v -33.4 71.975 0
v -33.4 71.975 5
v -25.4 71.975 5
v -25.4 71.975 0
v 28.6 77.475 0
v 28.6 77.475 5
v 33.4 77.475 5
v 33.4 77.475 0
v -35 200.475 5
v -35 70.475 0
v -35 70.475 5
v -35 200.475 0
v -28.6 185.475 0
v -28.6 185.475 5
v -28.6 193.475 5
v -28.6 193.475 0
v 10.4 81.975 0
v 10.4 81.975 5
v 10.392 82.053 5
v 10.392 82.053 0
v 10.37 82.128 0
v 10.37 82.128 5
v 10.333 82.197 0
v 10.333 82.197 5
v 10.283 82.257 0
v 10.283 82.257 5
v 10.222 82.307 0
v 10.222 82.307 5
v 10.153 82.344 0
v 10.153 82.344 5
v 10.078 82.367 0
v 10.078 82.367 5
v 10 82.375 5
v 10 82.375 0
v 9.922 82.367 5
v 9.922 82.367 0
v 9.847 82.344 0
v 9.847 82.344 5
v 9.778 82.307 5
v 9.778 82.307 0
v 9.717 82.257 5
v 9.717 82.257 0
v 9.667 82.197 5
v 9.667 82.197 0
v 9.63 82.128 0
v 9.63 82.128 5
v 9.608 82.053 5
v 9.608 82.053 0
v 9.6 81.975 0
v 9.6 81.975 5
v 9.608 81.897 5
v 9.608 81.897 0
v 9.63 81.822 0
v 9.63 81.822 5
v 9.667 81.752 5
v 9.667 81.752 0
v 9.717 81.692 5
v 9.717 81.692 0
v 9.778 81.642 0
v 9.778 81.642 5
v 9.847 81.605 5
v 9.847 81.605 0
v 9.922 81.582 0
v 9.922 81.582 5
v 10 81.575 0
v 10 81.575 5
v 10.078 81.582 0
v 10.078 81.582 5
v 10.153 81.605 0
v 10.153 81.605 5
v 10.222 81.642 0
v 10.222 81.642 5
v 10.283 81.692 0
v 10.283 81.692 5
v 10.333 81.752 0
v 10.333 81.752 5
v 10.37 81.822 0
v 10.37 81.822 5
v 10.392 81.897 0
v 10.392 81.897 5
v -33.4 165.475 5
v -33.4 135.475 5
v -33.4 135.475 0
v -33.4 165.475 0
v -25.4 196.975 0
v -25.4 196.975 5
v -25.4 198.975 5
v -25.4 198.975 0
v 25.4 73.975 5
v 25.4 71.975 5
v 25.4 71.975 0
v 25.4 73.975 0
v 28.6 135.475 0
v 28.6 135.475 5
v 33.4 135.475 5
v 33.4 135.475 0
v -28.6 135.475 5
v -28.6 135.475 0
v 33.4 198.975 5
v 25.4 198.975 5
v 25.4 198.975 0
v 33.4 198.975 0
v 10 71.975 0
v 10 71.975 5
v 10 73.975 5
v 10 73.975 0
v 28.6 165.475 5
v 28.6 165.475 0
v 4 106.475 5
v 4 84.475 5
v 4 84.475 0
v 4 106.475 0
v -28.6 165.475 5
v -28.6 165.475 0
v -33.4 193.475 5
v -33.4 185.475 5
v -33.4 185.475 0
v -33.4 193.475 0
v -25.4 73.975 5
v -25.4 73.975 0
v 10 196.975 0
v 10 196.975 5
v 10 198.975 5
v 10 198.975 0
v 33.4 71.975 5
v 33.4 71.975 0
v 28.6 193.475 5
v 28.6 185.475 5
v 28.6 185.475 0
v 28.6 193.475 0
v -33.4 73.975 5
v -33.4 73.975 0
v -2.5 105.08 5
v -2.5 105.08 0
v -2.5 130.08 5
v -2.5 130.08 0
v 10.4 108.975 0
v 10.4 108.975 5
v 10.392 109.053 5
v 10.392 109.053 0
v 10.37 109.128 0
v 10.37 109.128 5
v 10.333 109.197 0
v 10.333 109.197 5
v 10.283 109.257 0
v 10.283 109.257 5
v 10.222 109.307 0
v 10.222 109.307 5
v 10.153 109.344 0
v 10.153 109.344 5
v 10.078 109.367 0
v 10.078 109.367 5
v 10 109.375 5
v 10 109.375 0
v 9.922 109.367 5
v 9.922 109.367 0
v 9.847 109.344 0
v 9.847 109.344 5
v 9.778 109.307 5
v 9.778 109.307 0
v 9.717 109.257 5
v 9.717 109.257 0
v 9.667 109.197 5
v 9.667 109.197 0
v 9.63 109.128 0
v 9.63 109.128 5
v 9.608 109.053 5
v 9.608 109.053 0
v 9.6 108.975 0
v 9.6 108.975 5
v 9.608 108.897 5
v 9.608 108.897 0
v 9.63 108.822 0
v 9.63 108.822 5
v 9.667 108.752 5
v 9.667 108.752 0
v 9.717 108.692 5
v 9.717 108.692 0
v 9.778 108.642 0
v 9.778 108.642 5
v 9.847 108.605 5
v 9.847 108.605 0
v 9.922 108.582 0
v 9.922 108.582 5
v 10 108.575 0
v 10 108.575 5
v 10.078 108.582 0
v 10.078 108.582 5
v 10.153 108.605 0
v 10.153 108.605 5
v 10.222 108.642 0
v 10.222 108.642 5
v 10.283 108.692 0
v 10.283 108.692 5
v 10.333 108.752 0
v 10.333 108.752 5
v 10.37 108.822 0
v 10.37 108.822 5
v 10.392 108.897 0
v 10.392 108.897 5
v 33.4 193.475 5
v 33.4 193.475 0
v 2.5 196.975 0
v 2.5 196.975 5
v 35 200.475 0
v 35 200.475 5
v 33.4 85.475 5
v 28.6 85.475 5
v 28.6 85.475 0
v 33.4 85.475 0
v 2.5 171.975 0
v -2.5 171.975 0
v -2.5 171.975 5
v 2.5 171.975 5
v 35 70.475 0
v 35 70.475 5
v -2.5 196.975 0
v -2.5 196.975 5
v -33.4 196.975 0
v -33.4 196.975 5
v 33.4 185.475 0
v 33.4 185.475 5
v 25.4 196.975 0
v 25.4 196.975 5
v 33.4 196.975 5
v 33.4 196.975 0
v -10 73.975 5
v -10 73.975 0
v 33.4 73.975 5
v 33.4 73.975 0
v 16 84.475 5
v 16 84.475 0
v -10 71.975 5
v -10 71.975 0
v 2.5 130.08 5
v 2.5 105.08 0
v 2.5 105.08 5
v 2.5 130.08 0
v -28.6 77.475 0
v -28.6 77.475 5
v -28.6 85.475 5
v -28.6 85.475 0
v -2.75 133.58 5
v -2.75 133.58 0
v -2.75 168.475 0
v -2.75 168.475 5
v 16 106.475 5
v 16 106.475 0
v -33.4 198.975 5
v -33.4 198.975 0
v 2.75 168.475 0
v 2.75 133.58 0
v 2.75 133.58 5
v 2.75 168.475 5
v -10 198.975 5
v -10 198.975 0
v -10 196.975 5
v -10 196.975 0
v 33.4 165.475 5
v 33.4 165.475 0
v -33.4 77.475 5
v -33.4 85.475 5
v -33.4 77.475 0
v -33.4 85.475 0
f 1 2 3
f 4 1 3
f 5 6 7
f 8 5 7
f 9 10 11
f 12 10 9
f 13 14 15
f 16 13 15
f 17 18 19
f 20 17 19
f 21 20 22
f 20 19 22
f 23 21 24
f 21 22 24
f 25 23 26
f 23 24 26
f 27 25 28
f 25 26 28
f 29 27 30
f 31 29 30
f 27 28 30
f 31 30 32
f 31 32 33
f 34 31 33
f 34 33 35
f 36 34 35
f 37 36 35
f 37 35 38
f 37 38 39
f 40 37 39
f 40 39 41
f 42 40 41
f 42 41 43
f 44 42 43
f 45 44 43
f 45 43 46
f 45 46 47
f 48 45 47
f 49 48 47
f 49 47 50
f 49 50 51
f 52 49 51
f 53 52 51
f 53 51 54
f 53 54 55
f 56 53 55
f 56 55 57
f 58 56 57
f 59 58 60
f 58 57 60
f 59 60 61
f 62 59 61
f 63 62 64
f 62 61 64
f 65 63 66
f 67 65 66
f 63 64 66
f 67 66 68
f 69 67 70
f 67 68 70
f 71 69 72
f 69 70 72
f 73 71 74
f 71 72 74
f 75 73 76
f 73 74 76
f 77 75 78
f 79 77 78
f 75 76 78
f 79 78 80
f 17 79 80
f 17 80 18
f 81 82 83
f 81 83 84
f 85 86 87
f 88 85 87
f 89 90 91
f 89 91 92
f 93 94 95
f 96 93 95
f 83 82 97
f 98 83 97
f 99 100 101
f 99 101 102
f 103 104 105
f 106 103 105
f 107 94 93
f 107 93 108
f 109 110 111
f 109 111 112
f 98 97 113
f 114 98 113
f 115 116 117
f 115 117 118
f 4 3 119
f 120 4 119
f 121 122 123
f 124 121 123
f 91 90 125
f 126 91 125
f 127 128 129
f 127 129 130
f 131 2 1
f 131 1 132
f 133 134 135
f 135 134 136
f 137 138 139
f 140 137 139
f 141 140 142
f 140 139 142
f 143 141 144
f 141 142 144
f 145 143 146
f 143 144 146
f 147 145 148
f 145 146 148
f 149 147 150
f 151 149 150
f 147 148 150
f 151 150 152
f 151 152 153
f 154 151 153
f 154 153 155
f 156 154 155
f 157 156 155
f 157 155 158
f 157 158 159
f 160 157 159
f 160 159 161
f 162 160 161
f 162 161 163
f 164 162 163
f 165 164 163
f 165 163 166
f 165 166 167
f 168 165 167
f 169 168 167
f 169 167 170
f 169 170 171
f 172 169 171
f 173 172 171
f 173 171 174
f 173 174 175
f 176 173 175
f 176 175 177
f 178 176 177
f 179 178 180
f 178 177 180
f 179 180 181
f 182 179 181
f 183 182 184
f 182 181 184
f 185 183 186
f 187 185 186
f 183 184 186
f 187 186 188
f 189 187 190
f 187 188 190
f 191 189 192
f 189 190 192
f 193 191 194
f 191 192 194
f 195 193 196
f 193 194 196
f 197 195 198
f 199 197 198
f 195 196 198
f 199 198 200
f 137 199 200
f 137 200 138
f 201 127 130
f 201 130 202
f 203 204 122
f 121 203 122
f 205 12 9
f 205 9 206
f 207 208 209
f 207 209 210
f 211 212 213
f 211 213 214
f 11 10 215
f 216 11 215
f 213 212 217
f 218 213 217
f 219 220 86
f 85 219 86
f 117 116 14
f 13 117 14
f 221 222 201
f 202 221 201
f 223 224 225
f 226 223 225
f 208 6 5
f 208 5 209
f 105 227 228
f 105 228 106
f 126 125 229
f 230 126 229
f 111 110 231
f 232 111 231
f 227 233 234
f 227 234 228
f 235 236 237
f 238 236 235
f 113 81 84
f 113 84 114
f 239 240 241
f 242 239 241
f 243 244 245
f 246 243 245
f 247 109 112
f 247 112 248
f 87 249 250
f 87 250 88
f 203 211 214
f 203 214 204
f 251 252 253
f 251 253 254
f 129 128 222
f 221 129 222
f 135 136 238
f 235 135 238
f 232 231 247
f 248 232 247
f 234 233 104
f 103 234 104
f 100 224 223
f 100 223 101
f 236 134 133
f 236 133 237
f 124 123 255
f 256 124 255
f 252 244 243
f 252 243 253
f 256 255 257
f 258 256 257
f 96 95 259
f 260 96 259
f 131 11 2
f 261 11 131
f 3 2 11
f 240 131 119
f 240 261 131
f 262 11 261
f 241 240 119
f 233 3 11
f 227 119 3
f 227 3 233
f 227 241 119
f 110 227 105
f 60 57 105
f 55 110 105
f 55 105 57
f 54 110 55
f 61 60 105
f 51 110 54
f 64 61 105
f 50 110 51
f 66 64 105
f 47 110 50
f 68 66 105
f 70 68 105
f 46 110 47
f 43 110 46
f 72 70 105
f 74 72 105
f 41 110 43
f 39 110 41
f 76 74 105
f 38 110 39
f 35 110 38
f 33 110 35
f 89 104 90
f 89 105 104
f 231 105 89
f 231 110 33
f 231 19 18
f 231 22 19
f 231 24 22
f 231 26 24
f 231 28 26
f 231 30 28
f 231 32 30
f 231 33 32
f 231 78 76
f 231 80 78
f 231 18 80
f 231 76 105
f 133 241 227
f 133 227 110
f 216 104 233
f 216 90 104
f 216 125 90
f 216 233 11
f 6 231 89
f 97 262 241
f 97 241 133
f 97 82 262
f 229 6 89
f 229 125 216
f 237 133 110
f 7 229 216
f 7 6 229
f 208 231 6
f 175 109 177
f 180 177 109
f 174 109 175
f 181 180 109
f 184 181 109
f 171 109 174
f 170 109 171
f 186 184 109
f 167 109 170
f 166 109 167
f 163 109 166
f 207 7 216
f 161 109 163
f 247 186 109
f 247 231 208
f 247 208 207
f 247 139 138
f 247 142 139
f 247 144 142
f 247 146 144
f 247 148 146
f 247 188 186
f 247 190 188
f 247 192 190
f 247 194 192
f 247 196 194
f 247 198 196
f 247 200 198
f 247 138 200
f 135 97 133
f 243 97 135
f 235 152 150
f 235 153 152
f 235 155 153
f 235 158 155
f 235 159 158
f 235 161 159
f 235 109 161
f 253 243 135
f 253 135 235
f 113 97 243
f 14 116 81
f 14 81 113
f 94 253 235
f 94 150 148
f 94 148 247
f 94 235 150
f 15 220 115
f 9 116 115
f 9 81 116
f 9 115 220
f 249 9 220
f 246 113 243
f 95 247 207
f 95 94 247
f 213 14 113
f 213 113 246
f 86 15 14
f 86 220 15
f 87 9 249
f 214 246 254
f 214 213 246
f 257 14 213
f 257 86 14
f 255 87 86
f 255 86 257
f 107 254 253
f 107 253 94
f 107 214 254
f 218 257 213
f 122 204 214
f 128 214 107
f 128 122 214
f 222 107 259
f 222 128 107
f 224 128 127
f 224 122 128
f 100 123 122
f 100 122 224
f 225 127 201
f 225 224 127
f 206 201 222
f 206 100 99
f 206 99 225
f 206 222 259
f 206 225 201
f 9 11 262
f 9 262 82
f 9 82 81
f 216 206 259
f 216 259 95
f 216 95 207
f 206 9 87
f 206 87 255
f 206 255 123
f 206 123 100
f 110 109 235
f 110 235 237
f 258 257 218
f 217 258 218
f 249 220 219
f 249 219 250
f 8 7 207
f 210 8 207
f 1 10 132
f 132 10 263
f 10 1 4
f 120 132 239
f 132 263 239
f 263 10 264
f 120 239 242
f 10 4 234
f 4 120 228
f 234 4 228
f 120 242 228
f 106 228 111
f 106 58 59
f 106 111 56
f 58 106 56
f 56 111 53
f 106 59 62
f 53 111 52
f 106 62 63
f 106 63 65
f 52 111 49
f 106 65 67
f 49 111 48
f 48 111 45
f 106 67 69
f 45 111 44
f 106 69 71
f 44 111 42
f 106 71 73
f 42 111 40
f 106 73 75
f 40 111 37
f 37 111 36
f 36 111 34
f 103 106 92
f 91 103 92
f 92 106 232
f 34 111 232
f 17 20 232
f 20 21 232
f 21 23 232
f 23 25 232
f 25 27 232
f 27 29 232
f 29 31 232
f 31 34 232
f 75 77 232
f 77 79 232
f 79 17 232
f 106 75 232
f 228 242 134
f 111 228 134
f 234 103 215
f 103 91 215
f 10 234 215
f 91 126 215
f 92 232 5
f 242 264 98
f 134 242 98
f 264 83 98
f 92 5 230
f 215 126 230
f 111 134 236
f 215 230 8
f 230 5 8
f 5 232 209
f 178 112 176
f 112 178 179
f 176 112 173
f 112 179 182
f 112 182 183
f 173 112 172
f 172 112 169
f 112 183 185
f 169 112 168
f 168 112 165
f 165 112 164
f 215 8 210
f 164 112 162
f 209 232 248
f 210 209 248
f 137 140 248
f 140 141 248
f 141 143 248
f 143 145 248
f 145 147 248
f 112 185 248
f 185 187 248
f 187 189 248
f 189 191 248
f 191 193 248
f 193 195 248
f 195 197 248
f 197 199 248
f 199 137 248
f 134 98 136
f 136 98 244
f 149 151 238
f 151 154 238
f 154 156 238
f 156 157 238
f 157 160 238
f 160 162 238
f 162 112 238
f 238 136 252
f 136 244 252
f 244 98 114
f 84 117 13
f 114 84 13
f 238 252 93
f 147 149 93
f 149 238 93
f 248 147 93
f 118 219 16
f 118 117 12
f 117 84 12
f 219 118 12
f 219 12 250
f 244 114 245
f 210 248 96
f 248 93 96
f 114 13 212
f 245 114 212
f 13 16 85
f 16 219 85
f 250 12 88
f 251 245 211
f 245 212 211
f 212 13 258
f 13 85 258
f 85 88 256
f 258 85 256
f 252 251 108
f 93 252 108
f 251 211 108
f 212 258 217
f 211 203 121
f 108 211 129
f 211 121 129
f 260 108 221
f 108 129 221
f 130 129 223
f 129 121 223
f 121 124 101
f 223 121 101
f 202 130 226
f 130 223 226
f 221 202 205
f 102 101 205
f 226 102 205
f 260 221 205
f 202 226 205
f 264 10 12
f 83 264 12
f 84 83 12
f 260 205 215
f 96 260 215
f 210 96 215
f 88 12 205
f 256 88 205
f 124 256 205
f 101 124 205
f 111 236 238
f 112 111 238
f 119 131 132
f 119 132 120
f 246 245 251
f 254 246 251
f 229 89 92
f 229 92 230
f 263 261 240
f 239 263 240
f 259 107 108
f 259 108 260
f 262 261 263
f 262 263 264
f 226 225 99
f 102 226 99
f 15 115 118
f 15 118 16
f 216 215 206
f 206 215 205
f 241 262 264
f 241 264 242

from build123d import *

# Parameters (mm, degrees)
SKETCH1_W           = 70
SKETCH1_H           = 130
SKETCH1_W_2         = 5
SKETCH1_H_2         = 25
SKETCH1_W_3         = 5.5
SKETCH1_H_3         = 34.894660298
BOSS_EXTRUDE1_DEPTH = 5
CUT_EXTRUDE1_REACH  = 205.568
SKETCH2_W           = 4.8
SKETCH2_H           = 8
SKETCH2_H_2         = 30
SKETCH2_W_2         = 8
SKETCH2_H_3         = 2
SKETCH2_W_3         = 20
SKETCH2_W_4         = 12
SKETCH2_H_4         = 22
CUT_EXTRUDE2_REACH  = 205.568
SKETCH4_R           = 0.4


with BuildPart() as part:
    # Sketch1 → Boss-Extrude1 (new body)
    with BuildSketch(Plane.XY):
        with Locations((0, 135.474649456)):
            Rectangle(SKETCH1_W, SKETCH1_H)
        with Locations((0, 184.474649456)):
            Rectangle(SKETCH1_W_2, SKETCH1_H_2, mode=Mode.SUBTRACT)
        with Locations((0, 117.579989158)):
            Rectangle(SKETCH1_W_2, SKETCH1_H_2, mode=Mode.SUBTRACT)
        with Locations((0, 151.027319307)):
            Rectangle(SKETCH1_W_3, SKETCH1_H_3, mode=Mode.SUBTRACT)
    extrude(amount=BOSS_EXTRUDE1_DEPTH)

    # Sketch2 → Cut-Extrude1 (cut, up to next)
    with BuildSketch(Plane.XY.offset(5), mode=Mode.PRIVATE) as cut_extrude1_sk1:
        with Locations((-31, 189.474649456)):
            Rectangle(SKETCH2_W, SKETCH2_H)
    cut_extrude1_tool1 = extrude(cut_extrude1_sk1.sketch, amount=-CUT_EXTRUDE1_REACH, mode=Mode.PRIVATE) & part.part
    # Sketch2 → Cut-Extrude1 (cut, up to next)
    with BuildSketch(Plane.XY.offset(5), mode=Mode.PRIVATE) as cut_extrude1_sk2:
        with Locations((-31, 150.474649456)):
            Rectangle(SKETCH2_W, SKETCH2_H_2)
    cut_extrude1_tool2 = extrude(cut_extrude1_sk2.sketch, amount=-CUT_EXTRUDE1_REACH, mode=Mode.PRIVATE) & part.part
    # Sketch2 → Cut-Extrude1 (cut, up to next)
    with BuildSketch(Plane.XY.offset(5), mode=Mode.PRIVATE) as cut_extrude1_sk3:
        with Locations((-29.4, 197.974649456)):
            Rectangle(SKETCH2_W_2, SKETCH2_H_3)
    cut_extrude1_tool3 = extrude(cut_extrude1_sk3.sketch, amount=-CUT_EXTRUDE1_REACH, mode=Mode.PRIVATE) & part.part
    # Sketch2 → Cut-Extrude1 (cut, up to next)
    with BuildSketch(Plane.XY.offset(5), mode=Mode.PRIVATE) as cut_extrude1_sk4:
        with Locations((-31, 81.474649456)):
            Rectangle(SKETCH2_W, SKETCH2_H)
    cut_extrude1_tool4 = extrude(cut_extrude1_sk4.sketch, amount=-CUT_EXTRUDE1_REACH, mode=Mode.PRIVATE) & part.part
    # Sketch2 → Cut-Extrude1 (cut, up to next)
    with BuildSketch(Plane.XY.offset(5), mode=Mode.PRIVATE) as cut_extrude1_sk5:
        with Locations((31, 81.474649456)):
            Rectangle(SKETCH2_W, SKETCH2_H)
    cut_extrude1_tool5 = extrude(cut_extrude1_sk5.sketch, amount=-CUT_EXTRUDE1_REACH, mode=Mode.PRIVATE) & part.part
    # Sketch2 → Cut-Extrude1 (cut, up to next)
    with BuildSketch(Plane.XY.offset(5), mode=Mode.PRIVATE) as cut_extrude1_sk6:
        with Locations((31, 150.474649456)):
            Rectangle(SKETCH2_W, SKETCH2_H_2)
    cut_extrude1_tool6 = extrude(cut_extrude1_sk6.sketch, amount=-CUT_EXTRUDE1_REACH, mode=Mode.PRIVATE) & part.part
    # Sketch2 → Cut-Extrude1 (cut, up to next)
    with BuildSketch(Plane.XY.offset(5), mode=Mode.PRIVATE) as cut_extrude1_sk7:
        with Locations((31, 189.474649456)):
            Rectangle(SKETCH2_W, SKETCH2_H)
    cut_extrude1_tool7 = extrude(cut_extrude1_sk7.sketch, amount=-CUT_EXTRUDE1_REACH, mode=Mode.PRIVATE) & part.part
    # Sketch2 → Cut-Extrude1 (cut, up to next)
    with BuildSketch(Plane.XY.offset(5), mode=Mode.PRIVATE) as cut_extrude1_sk8:
        with Locations((29.4, 197.974649456)):
            Rectangle(SKETCH2_W_2, SKETCH2_H_3)
    cut_extrude1_tool8 = extrude(cut_extrude1_sk8.sketch, amount=-CUT_EXTRUDE1_REACH, mode=Mode.PRIVATE) & part.part
    # Sketch2 → Cut-Extrude1 (cut, up to next)
    with BuildSketch(Plane.XY.offset(5), mode=Mode.PRIVATE) as cut_extrude1_sk9:
        with Locations((-29.4, 72.974649456)):
            Rectangle(SKETCH2_W_2, SKETCH2_H_3)
    cut_extrude1_tool9 = extrude(cut_extrude1_sk9.sketch, amount=-CUT_EXTRUDE1_REACH, mode=Mode.PRIVATE) & part.part
    # Sketch2 → Cut-Extrude1 (cut, up to next)
    with BuildSketch(Plane.XY.offset(5), mode=Mode.PRIVATE) as cut_extrude1_sk10:
        with Locations((0, 72.974649456)):
            Rectangle(SKETCH2_W_3, SKETCH2_H_3)
    cut_extrude1_tool10 = extrude(cut_extrude1_sk10.sketch, amount=-CUT_EXTRUDE1_REACH, mode=Mode.PRIVATE) & part.part
    # Sketch2 → Cut-Extrude1 (cut, up to next)
    with BuildSketch(Plane.XY.offset(5), mode=Mode.PRIVATE) as cut_extrude1_sk11:
        with Locations((29.4, 72.974649456)):
            Rectangle(SKETCH2_W_2, SKETCH2_H_3)
    cut_extrude1_tool11 = extrude(cut_extrude1_sk11.sketch, amount=-CUT_EXTRUDE1_REACH, mode=Mode.PRIVATE) & part.part
    # Sketch2 → Cut-Extrude1 (cut, up to next)
    with BuildSketch(Plane.XY.offset(5), mode=Mode.PRIVATE) as cut_extrude1_sk12:
        with Locations((0, 197.974649456)):
            Rectangle(SKETCH2_W_3, SKETCH2_H_3)
    cut_extrude1_tool12 = extrude(cut_extrude1_sk12.sketch, amount=-CUT_EXTRUDE1_REACH, mode=Mode.PRIVATE) & part.part
    # Sketch2 → Cut-Extrude1 (cut, up to next)
    with BuildSketch(Plane.XY.offset(5), mode=Mode.PRIVATE) as cut_extrude1_sk13:
        with Locations((10, 95.474649456)):
            Rectangle(SKETCH2_W_4, SKETCH2_H_4)
    cut_extrude1_tool13 = extrude(cut_extrude1_sk13.sketch, amount=-CUT_EXTRUDE1_REACH, mode=Mode.PRIVATE) & part.part
    add(cut_extrude1_tool1.solids().sort_by_distance((-31, 189.474649, 5))[0], mode=Mode.SUBTRACT)
    add(cut_extrude1_tool2.solids().sort_by_distance((-31, 150.474649, 5))[0], mode=Mode.SUBTRACT)
    add(cut_extrude1_tool3.solids().sort_by_distance((-29.4, 197.974649, 5))[0], mode=Mode.SUBTRACT)
    add(cut_extrude1_tool4.solids().sort_by_distance((-31, 81.474649, 5))[0], mode=Mode.SUBTRACT)
    add(cut_extrude1_tool5.solids().sort_by_distance((31, 81.474649, 5))[0], mode=Mode.SUBTRACT)
    add(cut_extrude1_tool6.solids().sort_by_distance((31, 150.474649, 5))[0], mode=Mode.SUBTRACT)
    add(cut_extrude1_tool7.solids().sort_by_distance((31, 189.474649, 5))[0], mode=Mode.SUBTRACT)
    add(cut_extrude1_tool8.solids().sort_by_distance((29.4, 197.974649, 5))[0], mode=Mode.SUBTRACT)
    add(cut_extrude1_tool9.solids().sort_by_distance((-29.4, 72.974649, 5))[0], mode=Mode.SUBTRACT)
    add(cut_extrude1_tool10.solids().sort_by_distance((0, 72.974649, 5))[0], mode=Mode.SUBTRACT)
    add(cut_extrude1_tool11.solids().sort_by_distance((29.4, 72.974649, 5))[0], mode=Mode.SUBTRACT)
    add(cut_extrude1_tool12.solids().sort_by_distance((0, 197.974649, 5))[0], mode=Mode.SUBTRACT)
    add(cut_extrude1_tool13.solids().sort_by_distance((10, 95.474649, 5))[0], mode=Mode.SUBTRACT)

    # Sketch4 → Cut-Extrude2 (cut, up to next)
    with BuildSketch(Plane.XY.offset(5), mode=Mode.PRIVATE) as cut_extrude2_sk1:
        with Locations((10, 81.974649456)):
            Circle(SKETCH4_R)
    cut_extrude2_tool1 = extrude(cut_extrude2_sk1.sketch, amount=-CUT_EXTRUDE2_REACH, mode=Mode.PRIVATE) & part.part
    # Sketch4 → Cut-Extrude2 (cut, up to next)
    with BuildSketch(Plane.XY.offset(5), mode=Mode.PRIVATE) as cut_extrude2_sk2:
        with Locations((10, 108.974649456)):
            Circle(SKETCH4_R)
    cut_extrude2_tool2 = extrude(cut_extrude2_sk2.sketch, amount=-CUT_EXTRUDE2_REACH, mode=Mode.PRIVATE) & part.part
    add(cut_extrude2_tool1.solids().sort_by_distance((10, 81.974649, 5))[0], mode=Mode.SUBTRACT)
    add(cut_extrude2_tool2.solids().sort_by_distance((10, 108.974649, 5))[0], mode=Mode.SUBTRACT)


solid = part.part
